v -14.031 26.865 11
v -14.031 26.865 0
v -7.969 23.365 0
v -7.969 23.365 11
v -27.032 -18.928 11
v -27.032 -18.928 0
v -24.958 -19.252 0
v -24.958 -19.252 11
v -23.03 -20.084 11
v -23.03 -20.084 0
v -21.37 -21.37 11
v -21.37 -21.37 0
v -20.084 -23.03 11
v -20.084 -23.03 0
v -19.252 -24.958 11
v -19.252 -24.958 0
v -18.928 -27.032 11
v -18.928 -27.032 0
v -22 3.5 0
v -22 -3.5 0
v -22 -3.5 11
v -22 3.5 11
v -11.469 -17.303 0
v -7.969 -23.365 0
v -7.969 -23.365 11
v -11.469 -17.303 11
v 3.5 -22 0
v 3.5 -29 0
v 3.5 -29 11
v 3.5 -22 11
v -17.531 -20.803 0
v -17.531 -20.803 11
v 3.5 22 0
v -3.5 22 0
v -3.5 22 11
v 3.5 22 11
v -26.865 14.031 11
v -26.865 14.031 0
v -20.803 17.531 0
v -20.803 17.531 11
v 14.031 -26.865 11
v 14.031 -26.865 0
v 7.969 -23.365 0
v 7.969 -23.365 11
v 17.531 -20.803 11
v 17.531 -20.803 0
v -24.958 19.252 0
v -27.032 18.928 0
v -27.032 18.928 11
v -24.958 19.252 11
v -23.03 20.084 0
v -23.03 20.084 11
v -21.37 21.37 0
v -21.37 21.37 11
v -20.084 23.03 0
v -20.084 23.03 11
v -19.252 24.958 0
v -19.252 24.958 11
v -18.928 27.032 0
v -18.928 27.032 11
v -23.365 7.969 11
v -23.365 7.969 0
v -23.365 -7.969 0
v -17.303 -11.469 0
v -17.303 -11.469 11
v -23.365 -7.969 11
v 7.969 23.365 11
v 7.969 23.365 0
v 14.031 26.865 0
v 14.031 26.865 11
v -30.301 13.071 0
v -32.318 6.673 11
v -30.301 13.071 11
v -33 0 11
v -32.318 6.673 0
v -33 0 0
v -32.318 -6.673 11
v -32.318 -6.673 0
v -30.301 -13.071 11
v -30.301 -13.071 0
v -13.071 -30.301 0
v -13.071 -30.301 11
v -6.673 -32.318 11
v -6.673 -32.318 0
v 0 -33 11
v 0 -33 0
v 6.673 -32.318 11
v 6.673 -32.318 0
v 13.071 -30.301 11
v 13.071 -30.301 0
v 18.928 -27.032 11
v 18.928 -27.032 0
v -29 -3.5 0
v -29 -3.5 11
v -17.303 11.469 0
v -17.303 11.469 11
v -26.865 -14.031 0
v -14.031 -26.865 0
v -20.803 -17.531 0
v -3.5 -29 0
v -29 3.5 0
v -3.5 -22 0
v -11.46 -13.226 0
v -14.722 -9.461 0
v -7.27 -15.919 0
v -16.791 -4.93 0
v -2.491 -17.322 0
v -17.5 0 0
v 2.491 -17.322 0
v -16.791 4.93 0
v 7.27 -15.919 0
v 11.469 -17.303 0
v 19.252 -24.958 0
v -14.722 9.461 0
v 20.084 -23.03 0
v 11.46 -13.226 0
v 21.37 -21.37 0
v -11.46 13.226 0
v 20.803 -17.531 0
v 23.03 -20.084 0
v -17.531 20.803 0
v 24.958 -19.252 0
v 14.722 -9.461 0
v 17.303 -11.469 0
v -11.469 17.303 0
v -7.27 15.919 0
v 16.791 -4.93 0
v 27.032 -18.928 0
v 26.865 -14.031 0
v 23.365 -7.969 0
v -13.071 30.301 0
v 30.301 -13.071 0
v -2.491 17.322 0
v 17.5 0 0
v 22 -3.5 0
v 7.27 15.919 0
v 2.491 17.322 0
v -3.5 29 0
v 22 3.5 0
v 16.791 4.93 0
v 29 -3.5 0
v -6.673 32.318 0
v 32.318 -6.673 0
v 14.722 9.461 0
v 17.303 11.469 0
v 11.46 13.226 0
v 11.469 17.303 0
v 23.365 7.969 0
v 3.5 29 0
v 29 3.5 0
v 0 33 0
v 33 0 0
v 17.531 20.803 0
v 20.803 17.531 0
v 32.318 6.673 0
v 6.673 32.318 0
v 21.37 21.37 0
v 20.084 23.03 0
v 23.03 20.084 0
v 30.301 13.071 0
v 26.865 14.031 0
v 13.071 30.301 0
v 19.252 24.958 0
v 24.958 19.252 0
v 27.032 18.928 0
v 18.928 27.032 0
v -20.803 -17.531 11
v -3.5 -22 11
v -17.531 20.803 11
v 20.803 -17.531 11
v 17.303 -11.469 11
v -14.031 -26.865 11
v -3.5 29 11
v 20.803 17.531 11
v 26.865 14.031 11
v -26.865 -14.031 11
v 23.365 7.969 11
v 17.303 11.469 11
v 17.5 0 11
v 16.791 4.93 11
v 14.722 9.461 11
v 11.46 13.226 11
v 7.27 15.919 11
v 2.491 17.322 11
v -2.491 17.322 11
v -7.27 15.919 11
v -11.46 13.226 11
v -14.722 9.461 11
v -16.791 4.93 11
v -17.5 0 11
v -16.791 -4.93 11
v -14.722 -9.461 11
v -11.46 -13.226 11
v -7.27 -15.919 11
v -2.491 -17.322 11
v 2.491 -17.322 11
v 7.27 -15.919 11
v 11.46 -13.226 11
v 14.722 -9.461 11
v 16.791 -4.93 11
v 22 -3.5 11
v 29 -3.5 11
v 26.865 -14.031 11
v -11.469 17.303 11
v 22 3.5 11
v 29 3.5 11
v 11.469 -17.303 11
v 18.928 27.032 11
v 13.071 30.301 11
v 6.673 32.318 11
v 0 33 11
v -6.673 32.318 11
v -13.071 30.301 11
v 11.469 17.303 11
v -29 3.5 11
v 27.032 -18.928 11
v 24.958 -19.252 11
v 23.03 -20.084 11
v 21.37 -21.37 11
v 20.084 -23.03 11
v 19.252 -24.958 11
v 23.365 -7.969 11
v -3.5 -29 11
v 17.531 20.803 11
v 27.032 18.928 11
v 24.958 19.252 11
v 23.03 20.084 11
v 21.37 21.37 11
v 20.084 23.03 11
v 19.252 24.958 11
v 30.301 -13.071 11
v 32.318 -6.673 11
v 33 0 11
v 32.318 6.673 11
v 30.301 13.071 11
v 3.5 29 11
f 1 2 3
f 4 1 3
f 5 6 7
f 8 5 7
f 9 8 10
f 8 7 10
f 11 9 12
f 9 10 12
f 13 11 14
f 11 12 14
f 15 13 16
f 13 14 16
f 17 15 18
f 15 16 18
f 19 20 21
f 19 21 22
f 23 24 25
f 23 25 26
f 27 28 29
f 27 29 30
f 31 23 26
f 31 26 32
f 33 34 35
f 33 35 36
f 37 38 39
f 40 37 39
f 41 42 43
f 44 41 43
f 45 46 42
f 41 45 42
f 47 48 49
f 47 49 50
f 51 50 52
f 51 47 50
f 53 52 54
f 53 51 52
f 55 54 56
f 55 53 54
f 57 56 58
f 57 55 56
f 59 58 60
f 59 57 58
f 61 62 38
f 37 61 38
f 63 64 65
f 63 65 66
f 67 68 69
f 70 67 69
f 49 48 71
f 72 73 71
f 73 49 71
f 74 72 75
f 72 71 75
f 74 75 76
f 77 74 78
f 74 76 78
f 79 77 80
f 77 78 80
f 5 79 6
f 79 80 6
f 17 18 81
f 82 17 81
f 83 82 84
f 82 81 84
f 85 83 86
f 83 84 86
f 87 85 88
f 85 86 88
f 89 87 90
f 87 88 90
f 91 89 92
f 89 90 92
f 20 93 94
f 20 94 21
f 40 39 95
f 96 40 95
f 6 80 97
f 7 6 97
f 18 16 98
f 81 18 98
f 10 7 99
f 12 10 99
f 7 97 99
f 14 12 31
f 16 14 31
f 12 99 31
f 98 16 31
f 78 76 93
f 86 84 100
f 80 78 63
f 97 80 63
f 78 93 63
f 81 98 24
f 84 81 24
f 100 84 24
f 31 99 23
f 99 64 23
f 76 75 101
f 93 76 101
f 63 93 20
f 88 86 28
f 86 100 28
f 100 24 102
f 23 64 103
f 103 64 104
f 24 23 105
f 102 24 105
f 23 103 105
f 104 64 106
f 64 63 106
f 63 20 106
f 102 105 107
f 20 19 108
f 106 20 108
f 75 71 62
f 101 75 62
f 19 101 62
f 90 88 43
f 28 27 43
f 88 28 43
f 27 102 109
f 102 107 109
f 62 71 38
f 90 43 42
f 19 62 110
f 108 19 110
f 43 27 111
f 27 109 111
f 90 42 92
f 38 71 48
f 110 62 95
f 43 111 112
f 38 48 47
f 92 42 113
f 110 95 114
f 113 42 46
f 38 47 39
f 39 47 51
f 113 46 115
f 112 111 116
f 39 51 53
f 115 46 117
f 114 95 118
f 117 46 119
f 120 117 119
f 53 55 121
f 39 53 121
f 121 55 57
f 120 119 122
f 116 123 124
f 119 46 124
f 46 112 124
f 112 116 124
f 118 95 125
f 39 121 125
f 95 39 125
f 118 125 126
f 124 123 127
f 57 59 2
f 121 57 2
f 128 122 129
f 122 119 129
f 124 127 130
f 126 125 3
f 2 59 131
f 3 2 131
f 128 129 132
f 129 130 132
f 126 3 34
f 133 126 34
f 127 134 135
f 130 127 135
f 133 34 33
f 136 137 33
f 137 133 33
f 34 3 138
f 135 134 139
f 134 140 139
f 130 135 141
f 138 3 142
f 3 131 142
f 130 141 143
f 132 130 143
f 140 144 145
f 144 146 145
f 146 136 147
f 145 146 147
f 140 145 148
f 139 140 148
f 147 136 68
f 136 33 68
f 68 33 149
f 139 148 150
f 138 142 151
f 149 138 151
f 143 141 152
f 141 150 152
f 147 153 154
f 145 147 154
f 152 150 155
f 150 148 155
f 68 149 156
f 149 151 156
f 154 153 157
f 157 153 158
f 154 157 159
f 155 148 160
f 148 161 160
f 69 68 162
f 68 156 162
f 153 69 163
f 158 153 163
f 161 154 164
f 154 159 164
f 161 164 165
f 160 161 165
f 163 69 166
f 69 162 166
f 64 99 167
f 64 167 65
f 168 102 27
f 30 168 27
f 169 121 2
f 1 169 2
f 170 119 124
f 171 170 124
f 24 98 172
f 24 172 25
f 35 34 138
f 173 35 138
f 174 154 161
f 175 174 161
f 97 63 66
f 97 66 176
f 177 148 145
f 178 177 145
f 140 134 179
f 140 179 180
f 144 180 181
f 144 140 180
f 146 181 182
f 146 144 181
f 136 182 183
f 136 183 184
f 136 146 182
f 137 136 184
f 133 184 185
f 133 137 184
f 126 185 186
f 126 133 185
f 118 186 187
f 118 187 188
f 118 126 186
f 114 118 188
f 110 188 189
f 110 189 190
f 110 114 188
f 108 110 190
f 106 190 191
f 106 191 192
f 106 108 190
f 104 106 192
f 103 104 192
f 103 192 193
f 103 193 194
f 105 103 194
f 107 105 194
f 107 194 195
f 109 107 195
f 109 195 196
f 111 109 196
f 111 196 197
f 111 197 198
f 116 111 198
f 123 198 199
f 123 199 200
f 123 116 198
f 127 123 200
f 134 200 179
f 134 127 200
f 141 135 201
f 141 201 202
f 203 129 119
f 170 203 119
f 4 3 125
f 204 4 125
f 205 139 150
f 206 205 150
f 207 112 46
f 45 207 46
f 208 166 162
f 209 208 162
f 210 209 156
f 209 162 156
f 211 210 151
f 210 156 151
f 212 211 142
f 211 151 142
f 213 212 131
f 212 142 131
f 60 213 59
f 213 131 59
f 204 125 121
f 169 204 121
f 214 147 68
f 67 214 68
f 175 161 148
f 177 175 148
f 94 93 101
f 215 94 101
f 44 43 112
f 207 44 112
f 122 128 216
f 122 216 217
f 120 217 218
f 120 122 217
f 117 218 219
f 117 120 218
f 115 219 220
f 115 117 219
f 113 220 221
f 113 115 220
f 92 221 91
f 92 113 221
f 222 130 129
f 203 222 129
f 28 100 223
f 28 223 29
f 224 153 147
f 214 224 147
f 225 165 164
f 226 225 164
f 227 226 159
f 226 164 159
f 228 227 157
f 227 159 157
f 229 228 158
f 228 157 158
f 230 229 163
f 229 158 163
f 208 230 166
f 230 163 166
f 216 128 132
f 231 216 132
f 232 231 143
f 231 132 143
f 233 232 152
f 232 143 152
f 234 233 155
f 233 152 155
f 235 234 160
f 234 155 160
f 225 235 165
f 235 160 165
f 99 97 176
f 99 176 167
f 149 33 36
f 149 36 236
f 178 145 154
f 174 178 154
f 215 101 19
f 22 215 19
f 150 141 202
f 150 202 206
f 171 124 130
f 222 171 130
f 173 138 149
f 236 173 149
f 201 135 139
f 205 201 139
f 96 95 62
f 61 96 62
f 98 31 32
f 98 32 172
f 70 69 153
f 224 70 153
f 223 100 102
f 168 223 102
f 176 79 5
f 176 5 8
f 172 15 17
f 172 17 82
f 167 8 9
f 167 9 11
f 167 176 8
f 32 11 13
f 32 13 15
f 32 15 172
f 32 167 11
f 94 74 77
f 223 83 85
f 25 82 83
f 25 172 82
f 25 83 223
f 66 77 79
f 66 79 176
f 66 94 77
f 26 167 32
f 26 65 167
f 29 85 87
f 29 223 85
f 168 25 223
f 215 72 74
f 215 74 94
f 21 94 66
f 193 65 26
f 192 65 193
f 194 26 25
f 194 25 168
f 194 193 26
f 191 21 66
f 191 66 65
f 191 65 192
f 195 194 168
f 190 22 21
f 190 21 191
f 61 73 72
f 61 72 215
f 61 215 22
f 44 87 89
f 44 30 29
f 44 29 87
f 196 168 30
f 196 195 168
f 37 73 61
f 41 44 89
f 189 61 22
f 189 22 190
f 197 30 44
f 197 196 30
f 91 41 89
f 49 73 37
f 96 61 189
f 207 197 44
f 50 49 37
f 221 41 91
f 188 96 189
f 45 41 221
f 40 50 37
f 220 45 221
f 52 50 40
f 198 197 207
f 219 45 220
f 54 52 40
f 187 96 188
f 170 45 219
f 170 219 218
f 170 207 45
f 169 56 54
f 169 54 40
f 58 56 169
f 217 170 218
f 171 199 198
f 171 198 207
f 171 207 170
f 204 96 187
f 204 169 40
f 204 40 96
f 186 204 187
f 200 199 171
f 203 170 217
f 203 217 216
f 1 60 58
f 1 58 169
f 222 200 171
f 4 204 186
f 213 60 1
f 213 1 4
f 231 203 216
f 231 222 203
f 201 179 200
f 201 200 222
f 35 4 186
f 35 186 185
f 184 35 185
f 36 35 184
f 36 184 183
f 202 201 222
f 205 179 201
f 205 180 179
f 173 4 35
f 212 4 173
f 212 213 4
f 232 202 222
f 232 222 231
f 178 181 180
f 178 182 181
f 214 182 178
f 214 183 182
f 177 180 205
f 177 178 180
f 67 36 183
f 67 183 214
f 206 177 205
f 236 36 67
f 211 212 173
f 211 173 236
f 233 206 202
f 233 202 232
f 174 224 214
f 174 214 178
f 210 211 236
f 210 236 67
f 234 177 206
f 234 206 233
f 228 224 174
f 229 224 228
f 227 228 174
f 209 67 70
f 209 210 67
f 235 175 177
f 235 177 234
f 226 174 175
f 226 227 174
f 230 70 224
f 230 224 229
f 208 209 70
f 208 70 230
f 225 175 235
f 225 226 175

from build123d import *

# Parameters (mm, degrees)
SKETCH1_R            = 33
SKETCH1_R_2          = 17.5
SKETCH1_W            = 7
SKETCH1_H            = 7
BOSS_EXTRUDE1_DEPTH  = 11
CUT_EXTRUDE1_START   = -12
CUT_EXTRUDE1_DEPTH   = 13
MIRROR2_START        = -12
MIRROR2_COPY_1_DEPTH = 13


with BuildPart() as part:
    # Sketch1 → Boss-Extrude1 (new body)
    with BuildSketch(Plane.XY):
        Circle(SKETCH1_R)
        Circle(SKETCH1_R_2, mode=Mode.SUBTRACT)
        Polygon((17.302558883, 11.468911087), (20.802558883, 17.531088913), (26.86473671, 14.031088913), (23.36473671, 7.968911087), align=None, mode=Mode.SUBTRACT)
        with Locations((25.5, 0)):
            Rectangle(SKETCH1_W, SKETCH1_H, mode=Mode.SUBTRACT)
        Polygon((7.968911087, 23.36473671), (14.031088913, 26.86473671), (17.531088913, 20.802558883), (11.468911087, 17.302558883), align=None, mode=Mode.SUBTRACT)
        with Locations((0, 25.5)):
            Rectangle(SKETCH1_W, SKETCH1_H, mode=Mode.SUBTRACT)
        with Locations((-25.5, 0)):
            Rectangle(SKETCH1_W, SKETCH1_H, mode=Mode.SUBTRACT)
        Polygon((-23.36473671, 7.968911087), (-26.86473671, 14.031088913), (-20.802558883, 17.531088913), (-17.302558883, 11.468911087), align=None, mode=Mode.SUBTRACT)
        Polygon((-11.468911087, 17.302558883), (-17.531088913, 20.802558883), (-14.031088913, 26.86473671), (-7.968911087, 23.36473671), align=None, mode=Mode.SUBTRACT)
        Polygon((23.36473671, -7.968911087), (26.86473671, -14.031088913), (20.802558883, -17.531088913), (17.302558883, -11.468911087), align=None, mode=Mode.SUBTRACT)
        Polygon((11.468911087, -17.302558883), (17.531088913, -20.802558883), (14.031088913, -26.86473671), (7.968911087, -23.36473671), align=None, mode=Mode.SUBTRACT)
        with Locations((0, -25.5)):
            Rectangle(SKETCH1_W, SKETCH1_H, mode=Mode.SUBTRACT)
        Polygon((-7.968911087, -23.36473671), (-11.468911087, -17.302558883), (-17.531088913, -20.802558883), (-14.031088913, -26.86473671), align=None, mode=Mode.SUBTRACT)
        Polygon((-17.302558883, -11.468911087), (-23.36473671, -7.968911087), (-26.86473671, -14.031088913), (-20.802558883, -17.531088913), align=None, mode=Mode.SUBTRACT)
    extrude(amount=BOSS_EXTRUDE1_DEPTH)

    # Sketch2 → Cut-Extrude1 (cut)
    with BuildSketch(Plane.XY.offset(11).offset(CUT_EXTRUDE1_START)):
        with BuildLine():
            Line((-195.710732602, 14.035729655), (-27.032017462, 18.9280224))
            ThreePointArc((-27.032017462, 18.9280224), (-21.370045373, 21.370045373), (-18.9280224, 27.032017462))
            Line((-18.9280224, 27.032017462), (-14.035729655, 195.710732602))
            Line((-14.035729655, 195.710732602), (-252.683769537, 434.358772484))
            Line((-252.683769537, 434.358772484), (-434.358772484, 252.683769537))
            Line((-434.358772484, 252.683769537), (-195.710732602, 14.035729655))
        make_face()
    cut_extrude1 = extrude(amount=CUT_EXTRUDE1_DEPTH, mode=Mode.SUBTRACT)

    # Mirror1: Cut-Extrude1 across plane
    add(cut_extrude1.mirror(Plane(origin=(0, 0, 0), x_dir=(0, 0, 1), z_dir=(1, 0, 0))), mode=Mode.SUBTRACT)

    # Mirror2: Cut-Extrude1 across plane
    add(cut_extrude1.mirror(Plane.ZX), mode=Mode.SUBTRACT)

    # Mirror2 copy 1 sketch → Mirror2 copy 1 (cut)
    with BuildSketch(Plane(origin=(0, 0, 11), x_dir=(-1, 0, 0), z_dir=(0, 0, 1)).offset(MIRROR2_START)):
        with BuildLine():
            Line((-195.710732602, 14.035729655), (-27.032017462, 18.9280224))
            ThreePointArc((-27.032017462, 18.9280224), (-21.370045373, 21.370045373), (-18.9280224, 27.032017462))
            Line((-18.9280224, 27.032017462), (-14.035729655, 195.710732602))
            Line((-14.035729655, 195.710732602), (-252.683769537, 434.358772484))
            Line((-252.683769537, 434.358772484), (-434.358772484, 252.683769537))
            Line((-434.358772484, 252.683769537), (-195.710732602, 14.035729655))
        make_face()
    extrude(amount=MIRROR2_COPY_1_DEPTH, mode=Mode.SUBTRACT)


solid = part.part
